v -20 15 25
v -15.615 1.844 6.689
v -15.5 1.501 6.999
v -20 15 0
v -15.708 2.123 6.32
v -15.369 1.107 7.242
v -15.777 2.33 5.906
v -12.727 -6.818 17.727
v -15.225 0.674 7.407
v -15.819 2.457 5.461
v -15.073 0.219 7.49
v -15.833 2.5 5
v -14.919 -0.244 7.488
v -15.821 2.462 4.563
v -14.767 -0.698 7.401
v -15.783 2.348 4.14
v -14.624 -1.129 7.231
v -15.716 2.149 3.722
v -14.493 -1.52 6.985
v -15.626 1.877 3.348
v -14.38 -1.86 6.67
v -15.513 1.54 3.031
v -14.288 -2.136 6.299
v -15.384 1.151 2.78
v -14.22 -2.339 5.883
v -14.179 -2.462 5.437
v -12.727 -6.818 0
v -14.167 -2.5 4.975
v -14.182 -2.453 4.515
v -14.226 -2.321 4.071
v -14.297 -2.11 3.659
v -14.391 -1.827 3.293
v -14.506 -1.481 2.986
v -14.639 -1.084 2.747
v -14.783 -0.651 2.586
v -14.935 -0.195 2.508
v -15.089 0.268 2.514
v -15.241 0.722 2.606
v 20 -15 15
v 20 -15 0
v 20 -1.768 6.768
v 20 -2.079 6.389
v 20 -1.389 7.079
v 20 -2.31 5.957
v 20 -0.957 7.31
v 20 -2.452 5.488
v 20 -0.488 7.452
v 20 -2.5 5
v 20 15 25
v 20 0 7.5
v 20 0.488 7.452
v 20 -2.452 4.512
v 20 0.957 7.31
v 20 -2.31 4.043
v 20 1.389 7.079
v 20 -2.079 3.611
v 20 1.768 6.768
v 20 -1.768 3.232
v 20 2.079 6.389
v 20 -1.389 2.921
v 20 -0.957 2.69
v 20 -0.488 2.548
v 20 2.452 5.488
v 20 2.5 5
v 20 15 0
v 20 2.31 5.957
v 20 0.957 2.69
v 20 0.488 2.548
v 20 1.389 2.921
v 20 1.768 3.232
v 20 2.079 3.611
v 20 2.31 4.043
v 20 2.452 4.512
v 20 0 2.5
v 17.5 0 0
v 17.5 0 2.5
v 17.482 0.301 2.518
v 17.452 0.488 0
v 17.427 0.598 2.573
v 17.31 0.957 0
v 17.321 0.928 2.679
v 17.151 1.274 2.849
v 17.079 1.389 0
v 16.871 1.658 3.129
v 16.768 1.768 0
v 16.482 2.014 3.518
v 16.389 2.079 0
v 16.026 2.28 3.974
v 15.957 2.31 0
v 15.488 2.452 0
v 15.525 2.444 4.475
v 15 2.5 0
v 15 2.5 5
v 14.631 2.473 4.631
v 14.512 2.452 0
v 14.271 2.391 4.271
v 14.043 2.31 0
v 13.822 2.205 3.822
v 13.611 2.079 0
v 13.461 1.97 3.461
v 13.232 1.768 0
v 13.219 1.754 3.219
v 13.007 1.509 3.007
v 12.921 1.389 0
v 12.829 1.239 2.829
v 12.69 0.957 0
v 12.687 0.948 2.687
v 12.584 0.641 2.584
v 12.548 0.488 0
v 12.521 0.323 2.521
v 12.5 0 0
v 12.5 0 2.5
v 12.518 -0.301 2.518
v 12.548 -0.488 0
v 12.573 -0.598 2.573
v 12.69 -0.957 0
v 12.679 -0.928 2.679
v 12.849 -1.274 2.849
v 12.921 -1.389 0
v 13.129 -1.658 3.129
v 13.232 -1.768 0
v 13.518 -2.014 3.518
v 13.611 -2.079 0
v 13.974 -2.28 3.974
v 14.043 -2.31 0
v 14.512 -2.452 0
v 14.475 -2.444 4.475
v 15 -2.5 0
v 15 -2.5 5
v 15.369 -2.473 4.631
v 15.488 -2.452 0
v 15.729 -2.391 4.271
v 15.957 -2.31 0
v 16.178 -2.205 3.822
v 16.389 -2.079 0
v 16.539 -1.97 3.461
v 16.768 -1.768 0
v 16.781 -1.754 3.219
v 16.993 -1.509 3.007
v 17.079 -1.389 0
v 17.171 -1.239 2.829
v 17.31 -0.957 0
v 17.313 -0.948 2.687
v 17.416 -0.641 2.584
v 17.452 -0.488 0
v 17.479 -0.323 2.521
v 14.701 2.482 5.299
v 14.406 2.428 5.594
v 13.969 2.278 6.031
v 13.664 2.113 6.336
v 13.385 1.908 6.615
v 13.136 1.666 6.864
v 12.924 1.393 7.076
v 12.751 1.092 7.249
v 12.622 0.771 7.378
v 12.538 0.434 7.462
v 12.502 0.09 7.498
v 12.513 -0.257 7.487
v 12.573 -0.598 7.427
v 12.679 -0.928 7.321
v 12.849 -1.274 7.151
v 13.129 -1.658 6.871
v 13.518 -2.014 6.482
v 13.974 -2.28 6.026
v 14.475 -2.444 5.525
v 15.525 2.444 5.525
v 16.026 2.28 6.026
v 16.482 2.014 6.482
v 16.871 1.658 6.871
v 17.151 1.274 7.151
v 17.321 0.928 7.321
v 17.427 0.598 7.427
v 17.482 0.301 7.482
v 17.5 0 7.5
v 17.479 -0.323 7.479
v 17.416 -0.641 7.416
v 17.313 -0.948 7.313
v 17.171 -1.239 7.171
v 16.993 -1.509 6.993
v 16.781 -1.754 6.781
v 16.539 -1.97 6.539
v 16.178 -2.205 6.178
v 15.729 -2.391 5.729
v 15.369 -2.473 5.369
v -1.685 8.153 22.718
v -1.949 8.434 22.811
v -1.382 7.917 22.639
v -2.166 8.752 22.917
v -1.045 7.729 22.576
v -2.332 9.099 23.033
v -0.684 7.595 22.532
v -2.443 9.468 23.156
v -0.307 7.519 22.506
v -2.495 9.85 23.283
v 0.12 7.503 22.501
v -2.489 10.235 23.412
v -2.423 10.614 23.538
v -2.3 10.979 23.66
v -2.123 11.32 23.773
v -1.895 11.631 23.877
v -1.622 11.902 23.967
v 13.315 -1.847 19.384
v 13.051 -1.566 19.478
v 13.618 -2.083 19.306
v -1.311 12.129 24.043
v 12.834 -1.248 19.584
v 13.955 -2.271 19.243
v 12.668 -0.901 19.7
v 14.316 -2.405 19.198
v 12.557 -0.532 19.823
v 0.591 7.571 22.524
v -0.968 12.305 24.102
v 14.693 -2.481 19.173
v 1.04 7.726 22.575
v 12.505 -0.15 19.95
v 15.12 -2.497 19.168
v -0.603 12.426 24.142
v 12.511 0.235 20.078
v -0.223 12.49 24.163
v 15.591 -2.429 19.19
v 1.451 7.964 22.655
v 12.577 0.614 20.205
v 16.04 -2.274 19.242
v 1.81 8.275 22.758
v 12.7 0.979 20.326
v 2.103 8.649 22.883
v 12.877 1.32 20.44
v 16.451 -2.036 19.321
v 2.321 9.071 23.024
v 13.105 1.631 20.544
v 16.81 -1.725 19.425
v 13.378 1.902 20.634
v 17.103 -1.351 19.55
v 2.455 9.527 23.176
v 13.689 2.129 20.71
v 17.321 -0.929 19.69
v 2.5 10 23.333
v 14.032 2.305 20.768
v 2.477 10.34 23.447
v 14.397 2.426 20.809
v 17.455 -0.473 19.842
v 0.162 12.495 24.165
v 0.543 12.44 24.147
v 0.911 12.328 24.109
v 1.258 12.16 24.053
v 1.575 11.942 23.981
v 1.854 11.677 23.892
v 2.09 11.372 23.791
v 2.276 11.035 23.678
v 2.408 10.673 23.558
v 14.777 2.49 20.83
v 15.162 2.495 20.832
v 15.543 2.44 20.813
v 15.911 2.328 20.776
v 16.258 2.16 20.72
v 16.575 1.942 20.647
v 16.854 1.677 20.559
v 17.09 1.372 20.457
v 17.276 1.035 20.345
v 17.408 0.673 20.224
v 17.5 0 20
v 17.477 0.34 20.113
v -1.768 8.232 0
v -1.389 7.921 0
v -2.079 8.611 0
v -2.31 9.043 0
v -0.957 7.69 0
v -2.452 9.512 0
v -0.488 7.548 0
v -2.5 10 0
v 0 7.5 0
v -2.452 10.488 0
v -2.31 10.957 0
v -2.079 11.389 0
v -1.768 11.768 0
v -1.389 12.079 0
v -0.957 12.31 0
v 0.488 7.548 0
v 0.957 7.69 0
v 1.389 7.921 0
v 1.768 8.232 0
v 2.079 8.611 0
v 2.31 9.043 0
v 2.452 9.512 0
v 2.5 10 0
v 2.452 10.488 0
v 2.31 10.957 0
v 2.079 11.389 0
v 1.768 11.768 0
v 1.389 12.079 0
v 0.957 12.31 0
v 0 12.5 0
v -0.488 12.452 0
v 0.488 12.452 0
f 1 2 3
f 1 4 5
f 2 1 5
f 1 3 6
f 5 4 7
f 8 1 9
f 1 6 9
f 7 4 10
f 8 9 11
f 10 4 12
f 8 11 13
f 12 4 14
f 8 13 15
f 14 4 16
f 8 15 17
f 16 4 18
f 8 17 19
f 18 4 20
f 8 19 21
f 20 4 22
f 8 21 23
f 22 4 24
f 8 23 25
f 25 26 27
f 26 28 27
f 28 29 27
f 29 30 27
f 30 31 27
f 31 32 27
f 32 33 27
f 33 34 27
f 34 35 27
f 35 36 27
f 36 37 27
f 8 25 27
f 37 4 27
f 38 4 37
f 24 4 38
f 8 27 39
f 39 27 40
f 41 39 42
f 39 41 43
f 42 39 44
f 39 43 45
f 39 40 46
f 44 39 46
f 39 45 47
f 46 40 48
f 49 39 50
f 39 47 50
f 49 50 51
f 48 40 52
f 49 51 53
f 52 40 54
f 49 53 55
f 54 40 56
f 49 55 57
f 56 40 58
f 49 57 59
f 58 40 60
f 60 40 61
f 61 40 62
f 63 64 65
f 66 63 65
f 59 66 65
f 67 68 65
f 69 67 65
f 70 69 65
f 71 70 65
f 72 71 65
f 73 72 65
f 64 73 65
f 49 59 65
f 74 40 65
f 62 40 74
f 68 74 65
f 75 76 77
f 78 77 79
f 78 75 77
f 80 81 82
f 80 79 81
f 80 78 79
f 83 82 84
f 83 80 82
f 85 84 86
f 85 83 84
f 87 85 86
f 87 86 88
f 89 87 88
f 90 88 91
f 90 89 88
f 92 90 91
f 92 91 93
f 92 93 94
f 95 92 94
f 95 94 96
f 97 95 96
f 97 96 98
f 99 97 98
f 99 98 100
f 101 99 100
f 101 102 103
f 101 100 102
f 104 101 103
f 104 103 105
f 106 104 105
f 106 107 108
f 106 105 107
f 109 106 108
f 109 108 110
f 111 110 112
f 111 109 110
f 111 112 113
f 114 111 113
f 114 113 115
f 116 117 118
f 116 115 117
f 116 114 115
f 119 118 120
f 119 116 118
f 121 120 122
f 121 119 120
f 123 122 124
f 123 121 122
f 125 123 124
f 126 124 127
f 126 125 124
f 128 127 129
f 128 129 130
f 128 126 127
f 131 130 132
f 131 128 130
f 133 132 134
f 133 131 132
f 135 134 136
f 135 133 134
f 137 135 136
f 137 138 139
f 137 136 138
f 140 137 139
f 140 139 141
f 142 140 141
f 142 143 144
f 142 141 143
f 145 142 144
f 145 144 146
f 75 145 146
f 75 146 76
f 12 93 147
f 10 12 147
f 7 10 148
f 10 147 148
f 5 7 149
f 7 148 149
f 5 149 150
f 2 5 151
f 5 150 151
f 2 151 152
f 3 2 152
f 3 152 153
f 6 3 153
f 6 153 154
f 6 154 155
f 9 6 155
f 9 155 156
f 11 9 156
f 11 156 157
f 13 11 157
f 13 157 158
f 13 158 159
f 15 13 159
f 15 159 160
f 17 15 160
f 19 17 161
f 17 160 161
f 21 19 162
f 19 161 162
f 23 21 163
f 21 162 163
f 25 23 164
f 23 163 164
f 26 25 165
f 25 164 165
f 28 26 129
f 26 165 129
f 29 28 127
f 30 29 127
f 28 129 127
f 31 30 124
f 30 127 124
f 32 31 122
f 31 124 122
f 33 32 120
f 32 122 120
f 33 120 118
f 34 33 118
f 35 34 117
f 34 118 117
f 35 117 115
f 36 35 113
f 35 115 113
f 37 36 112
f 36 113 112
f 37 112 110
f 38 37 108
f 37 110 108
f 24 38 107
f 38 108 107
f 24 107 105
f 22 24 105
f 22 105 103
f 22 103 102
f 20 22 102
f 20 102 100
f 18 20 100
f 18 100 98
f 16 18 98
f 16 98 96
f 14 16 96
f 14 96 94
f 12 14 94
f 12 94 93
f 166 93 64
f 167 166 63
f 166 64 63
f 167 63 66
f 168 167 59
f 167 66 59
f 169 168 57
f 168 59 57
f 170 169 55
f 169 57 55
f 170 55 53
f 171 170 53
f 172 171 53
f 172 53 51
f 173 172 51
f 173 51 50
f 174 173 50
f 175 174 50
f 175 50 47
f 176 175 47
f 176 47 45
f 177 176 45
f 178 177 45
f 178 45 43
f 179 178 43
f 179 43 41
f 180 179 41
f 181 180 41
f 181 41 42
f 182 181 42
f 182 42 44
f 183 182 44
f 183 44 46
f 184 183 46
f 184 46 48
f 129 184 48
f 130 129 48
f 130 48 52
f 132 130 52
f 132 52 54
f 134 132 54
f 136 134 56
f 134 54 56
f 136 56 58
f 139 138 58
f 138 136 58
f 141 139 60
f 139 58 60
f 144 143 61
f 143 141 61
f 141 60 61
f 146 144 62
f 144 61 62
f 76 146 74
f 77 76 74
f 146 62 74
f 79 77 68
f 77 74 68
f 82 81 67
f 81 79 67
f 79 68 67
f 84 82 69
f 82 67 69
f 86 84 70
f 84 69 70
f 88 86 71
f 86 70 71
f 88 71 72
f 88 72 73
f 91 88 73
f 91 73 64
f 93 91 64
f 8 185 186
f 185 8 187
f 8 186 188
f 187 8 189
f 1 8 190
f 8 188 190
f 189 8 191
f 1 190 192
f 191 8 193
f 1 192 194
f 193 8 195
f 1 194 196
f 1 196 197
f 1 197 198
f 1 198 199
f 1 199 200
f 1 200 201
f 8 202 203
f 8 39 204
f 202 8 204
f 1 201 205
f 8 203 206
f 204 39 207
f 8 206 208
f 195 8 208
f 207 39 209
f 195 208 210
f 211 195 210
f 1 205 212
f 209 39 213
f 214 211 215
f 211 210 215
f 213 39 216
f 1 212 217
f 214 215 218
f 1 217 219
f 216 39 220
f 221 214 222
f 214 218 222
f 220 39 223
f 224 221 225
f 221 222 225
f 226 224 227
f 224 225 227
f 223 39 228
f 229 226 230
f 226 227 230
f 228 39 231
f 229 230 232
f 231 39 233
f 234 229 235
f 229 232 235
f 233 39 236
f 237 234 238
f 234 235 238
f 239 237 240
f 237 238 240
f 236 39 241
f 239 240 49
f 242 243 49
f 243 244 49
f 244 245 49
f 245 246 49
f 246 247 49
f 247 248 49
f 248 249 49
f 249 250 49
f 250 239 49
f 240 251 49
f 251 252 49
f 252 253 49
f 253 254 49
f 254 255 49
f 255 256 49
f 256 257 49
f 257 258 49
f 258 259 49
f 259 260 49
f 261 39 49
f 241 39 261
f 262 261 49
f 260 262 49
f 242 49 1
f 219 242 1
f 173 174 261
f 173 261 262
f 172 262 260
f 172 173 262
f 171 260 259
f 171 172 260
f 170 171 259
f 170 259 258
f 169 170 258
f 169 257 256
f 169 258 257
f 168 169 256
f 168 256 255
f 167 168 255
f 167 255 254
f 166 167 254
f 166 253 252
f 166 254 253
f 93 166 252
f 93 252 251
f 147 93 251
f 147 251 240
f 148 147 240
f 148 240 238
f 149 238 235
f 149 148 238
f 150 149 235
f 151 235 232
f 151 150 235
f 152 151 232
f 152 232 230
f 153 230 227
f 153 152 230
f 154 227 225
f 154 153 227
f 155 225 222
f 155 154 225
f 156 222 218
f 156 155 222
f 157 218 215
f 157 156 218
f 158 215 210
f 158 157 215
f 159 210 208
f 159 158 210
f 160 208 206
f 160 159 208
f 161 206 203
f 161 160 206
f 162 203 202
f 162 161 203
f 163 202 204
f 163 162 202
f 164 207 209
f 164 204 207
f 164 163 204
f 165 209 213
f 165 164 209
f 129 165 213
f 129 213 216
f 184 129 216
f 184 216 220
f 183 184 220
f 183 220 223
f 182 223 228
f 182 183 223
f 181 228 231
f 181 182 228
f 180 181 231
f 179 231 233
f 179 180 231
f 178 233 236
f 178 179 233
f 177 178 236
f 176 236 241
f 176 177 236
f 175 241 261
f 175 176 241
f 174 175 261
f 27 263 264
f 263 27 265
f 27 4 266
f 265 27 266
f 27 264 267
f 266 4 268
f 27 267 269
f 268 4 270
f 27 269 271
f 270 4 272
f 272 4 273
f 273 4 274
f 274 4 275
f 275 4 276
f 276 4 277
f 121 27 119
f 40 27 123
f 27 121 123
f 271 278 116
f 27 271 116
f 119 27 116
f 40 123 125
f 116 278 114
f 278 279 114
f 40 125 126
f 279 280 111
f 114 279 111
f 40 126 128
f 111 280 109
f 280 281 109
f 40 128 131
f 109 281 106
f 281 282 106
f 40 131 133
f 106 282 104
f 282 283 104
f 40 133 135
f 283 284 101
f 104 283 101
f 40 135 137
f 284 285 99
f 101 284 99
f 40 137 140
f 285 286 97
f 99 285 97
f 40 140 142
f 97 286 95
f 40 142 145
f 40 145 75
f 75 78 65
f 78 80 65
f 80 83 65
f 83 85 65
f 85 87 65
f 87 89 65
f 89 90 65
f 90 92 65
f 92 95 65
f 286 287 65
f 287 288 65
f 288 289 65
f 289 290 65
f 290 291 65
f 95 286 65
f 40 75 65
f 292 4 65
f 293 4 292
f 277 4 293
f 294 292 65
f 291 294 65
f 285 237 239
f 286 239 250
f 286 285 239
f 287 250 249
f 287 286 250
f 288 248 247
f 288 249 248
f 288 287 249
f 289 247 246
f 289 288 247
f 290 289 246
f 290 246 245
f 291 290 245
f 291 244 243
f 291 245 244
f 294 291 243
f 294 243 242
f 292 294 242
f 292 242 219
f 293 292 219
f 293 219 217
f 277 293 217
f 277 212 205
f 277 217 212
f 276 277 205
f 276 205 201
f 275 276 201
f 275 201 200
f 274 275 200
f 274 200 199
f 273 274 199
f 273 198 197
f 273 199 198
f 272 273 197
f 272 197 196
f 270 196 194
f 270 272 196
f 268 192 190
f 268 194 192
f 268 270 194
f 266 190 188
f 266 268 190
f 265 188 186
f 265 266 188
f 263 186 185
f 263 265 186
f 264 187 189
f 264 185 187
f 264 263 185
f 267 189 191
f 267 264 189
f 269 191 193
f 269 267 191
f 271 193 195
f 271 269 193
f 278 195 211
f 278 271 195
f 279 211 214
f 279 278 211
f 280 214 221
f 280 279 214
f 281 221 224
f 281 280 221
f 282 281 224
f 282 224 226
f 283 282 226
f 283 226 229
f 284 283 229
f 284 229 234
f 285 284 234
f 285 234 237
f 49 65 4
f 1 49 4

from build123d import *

# Parameters (mm, degrees)
F0_R     = 2.5
F1_DEPTH = 25
F2_R     = 2.5
F3_DEPTH = 40.001


with BuildPart() as f1:
    # F0 (on Top) → F1 (new body)
    with BuildSketch(Plane.XY):
        Polygon((20, -15), (20, 15), (-20, 15), (-12.727273, -6.818182), align=None)
        with Locations((15, 0)):
            Circle(F0_R, mode=Mode.SUBTRACT)
        with Locations((0, 10)):
            Circle(F0_R, mode=Mode.SUBTRACT)
    extrude(amount=F1_DEPTH)

    # F2 (on face) → F3 (cut, through all)
    with BuildSketch(Plane.YZ.offset(20)):
        with Locations((0, 5)):
            Circle(F2_R)
        Polygon((-15, 15), (15, 25), (-15, 25), align=None)
    extrude(amount=-F3_DEPTH, mode=Mode.SUBTRACT)


solid = f1.part
